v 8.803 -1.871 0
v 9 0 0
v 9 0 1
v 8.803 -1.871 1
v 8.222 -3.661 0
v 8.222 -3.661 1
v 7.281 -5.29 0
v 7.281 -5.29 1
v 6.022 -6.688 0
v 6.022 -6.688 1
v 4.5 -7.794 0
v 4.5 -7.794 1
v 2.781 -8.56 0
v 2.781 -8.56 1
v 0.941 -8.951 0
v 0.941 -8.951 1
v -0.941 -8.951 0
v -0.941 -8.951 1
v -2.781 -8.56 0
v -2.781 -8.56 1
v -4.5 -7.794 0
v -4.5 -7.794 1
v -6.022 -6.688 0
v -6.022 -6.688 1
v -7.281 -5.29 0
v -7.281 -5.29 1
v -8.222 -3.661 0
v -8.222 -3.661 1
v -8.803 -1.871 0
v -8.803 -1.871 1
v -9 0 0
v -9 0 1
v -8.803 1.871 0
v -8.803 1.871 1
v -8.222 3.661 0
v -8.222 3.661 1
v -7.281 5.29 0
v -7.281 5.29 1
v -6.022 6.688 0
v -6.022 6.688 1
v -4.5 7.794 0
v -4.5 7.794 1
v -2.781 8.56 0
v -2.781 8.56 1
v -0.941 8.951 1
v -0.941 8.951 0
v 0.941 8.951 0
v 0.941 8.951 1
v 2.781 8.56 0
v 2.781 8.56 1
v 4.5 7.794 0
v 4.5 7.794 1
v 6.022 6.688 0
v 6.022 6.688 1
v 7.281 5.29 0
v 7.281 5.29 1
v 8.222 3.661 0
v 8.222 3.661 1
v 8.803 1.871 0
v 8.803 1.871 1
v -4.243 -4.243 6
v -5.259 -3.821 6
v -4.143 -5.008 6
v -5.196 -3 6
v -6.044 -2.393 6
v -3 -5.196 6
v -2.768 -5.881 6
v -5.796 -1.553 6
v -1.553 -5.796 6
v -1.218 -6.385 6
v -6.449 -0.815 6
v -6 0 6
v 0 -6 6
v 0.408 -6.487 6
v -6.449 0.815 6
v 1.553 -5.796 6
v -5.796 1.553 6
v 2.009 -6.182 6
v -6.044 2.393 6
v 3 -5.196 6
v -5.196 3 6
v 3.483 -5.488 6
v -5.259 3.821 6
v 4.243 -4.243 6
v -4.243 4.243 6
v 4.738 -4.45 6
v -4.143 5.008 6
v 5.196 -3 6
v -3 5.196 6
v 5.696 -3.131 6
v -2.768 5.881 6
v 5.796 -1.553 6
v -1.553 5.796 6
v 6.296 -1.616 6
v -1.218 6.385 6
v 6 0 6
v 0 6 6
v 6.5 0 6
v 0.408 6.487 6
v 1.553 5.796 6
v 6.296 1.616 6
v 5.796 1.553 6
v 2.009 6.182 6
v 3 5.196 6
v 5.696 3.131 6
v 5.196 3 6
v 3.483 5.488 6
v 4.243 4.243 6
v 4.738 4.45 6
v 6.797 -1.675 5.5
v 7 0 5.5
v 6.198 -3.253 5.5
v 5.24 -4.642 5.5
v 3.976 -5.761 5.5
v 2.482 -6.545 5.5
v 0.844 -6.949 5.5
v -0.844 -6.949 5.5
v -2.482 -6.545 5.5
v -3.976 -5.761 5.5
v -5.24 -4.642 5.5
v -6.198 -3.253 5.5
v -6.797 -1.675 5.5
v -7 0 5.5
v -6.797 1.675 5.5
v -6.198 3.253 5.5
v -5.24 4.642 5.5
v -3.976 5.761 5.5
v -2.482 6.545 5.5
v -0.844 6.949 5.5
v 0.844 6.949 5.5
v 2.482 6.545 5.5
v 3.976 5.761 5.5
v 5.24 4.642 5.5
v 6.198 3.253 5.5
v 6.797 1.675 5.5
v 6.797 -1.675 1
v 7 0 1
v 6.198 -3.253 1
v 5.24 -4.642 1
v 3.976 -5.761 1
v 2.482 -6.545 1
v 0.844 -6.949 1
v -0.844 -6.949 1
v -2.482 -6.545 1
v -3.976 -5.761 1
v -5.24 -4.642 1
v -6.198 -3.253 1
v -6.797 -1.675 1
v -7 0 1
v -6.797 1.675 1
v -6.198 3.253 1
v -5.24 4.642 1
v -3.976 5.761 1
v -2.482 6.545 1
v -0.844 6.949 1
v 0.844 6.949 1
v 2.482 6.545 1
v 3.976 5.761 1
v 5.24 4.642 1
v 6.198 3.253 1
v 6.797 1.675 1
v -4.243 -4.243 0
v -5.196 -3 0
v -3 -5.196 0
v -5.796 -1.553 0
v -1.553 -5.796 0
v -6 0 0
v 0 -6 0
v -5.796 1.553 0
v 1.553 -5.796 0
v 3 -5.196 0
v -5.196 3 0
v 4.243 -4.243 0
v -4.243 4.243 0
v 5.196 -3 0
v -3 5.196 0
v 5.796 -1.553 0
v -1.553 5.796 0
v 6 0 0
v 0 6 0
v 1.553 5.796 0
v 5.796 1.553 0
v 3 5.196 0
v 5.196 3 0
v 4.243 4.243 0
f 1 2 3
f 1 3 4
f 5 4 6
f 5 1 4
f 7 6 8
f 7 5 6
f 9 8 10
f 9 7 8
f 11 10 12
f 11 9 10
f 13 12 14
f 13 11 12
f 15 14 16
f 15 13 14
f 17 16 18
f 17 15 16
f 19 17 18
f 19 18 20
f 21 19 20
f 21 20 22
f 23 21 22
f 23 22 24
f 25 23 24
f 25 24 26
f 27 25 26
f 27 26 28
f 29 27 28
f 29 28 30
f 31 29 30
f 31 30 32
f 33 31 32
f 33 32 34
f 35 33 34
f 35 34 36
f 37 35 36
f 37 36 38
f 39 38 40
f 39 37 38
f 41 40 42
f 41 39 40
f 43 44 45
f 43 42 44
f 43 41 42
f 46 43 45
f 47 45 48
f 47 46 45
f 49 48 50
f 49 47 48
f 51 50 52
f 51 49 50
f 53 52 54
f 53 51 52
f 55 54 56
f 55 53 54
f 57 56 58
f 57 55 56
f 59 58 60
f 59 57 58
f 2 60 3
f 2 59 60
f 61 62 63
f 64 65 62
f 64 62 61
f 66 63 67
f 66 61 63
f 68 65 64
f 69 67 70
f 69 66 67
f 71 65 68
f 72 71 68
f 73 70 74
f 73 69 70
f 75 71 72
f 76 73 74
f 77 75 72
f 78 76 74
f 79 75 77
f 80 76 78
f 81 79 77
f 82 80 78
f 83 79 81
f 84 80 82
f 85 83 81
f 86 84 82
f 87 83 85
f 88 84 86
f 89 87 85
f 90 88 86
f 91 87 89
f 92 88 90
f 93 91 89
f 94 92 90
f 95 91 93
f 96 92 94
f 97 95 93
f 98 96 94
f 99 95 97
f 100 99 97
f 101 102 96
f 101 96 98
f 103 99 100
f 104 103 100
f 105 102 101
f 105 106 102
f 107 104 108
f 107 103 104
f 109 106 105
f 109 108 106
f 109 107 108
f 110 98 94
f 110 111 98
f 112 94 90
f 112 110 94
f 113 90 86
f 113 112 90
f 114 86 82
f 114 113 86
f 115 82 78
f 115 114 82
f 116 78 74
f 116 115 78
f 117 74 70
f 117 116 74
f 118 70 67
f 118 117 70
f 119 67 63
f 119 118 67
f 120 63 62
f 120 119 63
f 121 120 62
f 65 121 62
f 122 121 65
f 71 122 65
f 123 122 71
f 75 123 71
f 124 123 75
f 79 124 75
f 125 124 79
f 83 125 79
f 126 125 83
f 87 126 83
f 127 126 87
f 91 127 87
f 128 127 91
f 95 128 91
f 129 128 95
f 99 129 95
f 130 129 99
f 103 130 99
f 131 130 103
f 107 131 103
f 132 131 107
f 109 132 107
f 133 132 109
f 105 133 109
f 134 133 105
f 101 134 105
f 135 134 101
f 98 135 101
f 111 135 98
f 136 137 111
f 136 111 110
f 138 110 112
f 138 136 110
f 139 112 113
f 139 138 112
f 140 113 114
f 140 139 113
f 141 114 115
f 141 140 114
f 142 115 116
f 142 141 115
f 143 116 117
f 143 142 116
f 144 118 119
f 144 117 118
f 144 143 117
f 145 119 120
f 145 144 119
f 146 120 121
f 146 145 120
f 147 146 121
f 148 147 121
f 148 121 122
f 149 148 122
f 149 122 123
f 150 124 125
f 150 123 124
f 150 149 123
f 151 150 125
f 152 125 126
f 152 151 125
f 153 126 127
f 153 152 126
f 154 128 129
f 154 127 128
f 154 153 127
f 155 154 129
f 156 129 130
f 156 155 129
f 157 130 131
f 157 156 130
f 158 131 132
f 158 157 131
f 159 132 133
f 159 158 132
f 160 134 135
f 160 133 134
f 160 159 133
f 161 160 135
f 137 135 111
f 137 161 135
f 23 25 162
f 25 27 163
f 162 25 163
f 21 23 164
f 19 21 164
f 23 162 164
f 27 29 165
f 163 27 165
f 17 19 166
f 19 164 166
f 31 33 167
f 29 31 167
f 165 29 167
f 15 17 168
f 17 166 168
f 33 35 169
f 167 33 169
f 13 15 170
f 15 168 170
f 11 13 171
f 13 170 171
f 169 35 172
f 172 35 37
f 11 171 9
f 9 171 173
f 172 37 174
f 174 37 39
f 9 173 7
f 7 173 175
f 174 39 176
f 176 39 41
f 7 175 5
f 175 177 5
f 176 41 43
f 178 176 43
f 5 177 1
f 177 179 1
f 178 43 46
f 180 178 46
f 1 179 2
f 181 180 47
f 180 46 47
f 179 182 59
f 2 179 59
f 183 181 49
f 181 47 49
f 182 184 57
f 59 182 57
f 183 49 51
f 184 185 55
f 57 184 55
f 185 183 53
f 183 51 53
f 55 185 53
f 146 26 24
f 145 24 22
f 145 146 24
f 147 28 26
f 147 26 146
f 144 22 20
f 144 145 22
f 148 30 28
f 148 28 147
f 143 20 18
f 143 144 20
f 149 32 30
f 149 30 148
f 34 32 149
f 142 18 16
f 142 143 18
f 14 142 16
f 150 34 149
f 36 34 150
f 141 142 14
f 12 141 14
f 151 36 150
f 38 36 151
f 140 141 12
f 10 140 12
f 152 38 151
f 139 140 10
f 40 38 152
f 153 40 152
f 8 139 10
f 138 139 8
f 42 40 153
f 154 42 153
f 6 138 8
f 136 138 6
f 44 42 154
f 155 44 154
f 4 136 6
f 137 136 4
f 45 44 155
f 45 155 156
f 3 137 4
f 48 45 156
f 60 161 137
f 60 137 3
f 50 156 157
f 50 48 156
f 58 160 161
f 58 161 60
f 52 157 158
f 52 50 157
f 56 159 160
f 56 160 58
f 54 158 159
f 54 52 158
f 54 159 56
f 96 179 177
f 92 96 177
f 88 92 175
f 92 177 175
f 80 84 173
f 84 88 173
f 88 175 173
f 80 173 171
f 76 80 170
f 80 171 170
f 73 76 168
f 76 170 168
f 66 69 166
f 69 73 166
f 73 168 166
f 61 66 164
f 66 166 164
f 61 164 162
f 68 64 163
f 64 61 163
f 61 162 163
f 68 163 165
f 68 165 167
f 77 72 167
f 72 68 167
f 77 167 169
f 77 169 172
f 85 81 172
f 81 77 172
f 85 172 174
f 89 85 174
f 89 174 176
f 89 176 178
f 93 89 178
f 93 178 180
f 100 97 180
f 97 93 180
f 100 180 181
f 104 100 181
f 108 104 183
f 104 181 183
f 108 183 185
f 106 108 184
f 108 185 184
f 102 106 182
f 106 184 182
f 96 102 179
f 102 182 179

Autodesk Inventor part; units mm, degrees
ref_plane "YZ Plane" through (0, 0, 0) normal (1, 0, 0) x (0, 1, 0)
ref_plane "XZ Plane" through (0, 0, 0) normal (0, 1, 0) x (-1, 0, 0)
ref_plane "XY Plane" through (0, 0, 0) normal (0, 0, 1) x (1, 0, 0)
sketch "スケッチ1" plane through (0, 0, 0) normal (0, 0, 1) x (1, 0, 0)
  circle A0 centre (0, 0) radius 9
  circle A1 centre (0, 0) radius 6
  dimension "d0" = 18
  dimension "d1" = 12
extrude "押し出し1" add sketch "スケッチ1" along normal blind 1
sketch "スケッチ2" plane through (0, 0, 1) normal (0, 0, 1) x (1, 0, 0)
  circle A0 centre (0, 0) radius 9 projected
  circle A1 centre (0, 0) radius 6 projected
  circle A2 centre (0, 0) radius 7
  dimension "d4" = 14
extrude "押し出し2" add sketch "スケッチ2" along normal blind 5 contours A2
chamfer "面取り1" distance 0.5 angle 45 1 edges at (-7, 0, 6)
properties part number "オイレスw5f6-10a" material "アセタール樹脂、黒"
